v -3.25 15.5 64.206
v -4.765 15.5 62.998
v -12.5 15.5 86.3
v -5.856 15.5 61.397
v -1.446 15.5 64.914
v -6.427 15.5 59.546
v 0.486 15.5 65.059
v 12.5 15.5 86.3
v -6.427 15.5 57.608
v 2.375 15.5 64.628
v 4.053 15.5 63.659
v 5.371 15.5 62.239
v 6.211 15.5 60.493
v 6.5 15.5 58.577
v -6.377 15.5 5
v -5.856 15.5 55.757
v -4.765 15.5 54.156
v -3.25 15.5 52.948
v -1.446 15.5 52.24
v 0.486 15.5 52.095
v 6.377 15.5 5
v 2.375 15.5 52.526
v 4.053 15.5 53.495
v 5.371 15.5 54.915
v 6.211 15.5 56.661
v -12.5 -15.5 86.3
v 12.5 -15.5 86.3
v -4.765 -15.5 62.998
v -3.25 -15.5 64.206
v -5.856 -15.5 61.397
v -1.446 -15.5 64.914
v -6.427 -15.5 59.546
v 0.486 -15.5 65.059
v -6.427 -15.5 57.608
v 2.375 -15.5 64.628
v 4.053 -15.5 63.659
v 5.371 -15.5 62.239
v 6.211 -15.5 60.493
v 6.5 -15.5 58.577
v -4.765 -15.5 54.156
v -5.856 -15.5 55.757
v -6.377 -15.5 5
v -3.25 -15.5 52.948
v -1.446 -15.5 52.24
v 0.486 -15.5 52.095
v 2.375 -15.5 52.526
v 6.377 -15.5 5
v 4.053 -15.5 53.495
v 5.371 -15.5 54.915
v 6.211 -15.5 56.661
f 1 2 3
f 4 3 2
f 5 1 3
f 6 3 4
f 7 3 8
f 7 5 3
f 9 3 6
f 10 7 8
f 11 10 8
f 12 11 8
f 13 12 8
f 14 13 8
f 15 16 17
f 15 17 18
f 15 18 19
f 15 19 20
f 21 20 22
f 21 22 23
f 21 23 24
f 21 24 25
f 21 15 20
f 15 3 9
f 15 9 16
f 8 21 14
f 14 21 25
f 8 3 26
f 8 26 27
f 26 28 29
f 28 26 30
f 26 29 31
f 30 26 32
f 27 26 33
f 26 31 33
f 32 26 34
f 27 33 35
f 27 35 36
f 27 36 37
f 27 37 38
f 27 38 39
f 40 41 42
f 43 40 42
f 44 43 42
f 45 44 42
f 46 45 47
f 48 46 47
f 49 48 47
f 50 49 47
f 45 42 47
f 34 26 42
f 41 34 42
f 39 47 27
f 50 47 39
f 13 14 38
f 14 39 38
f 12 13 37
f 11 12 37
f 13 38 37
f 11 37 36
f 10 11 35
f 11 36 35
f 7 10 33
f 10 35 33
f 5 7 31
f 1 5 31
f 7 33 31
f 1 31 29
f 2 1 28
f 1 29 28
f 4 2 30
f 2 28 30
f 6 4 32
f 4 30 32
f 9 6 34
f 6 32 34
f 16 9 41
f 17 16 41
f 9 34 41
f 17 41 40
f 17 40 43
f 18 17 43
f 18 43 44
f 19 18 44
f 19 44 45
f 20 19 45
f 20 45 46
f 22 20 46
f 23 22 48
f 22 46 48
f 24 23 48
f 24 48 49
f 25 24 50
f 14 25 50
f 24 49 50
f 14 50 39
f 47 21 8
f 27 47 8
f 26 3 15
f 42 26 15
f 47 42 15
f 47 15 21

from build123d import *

# Parameters (mm, degrees)
F0_W     = 25
F0_H     = 31
F1_DEPTH = 86.3
F2_R     = 6.5
F3_DEPTH = 31.5
F5_DEPTH = 31.001
F6_W     = 20
F6_H     = 5
F7_DEPTH = 50


with BuildPart() as f1:
    # F0 (on Top) → F1 (new body)
    with BuildSketch(Plane.XY):
        Rectangle(F0_W, F0_H)
    extrude(amount=F1_DEPTH)

    # F2 (on Front) → F3 (cut, symmetric)
    with BuildSketch(Plane.XZ):
        with Locations((0, 58.577)):
            Circle(F2_R)
    extrude(amount=F3_DEPTH, both=True, mode=Mode.SUBTRACT)

    # F4 (on face) → F5 (cut, through all)
    with BuildSketch(Plane(origin=(0, 15.5, 0), x_dir=(-1, 0, 0), z_dir=(0, 1, 0))):
        Polygon((12.5, 0), (12.5, 86.3), (6, 0), align=None)
        Polygon((-6, 0), (-12.5, 86.3), (-12.5, 0), align=None)
    extrude(amount=-F5_DEPTH, mode=Mode.SUBTRACT)

    # F6 (on Front) → F7 (cut, symmetric)
    with BuildSketch(Plane.XZ):
        with Locations((0, 2.5)):
            Rectangle(F6_W, F6_H)
    extrude(amount=F7_DEPTH, both=True, mode=Mode.SUBTRACT)


solid = f1.part
